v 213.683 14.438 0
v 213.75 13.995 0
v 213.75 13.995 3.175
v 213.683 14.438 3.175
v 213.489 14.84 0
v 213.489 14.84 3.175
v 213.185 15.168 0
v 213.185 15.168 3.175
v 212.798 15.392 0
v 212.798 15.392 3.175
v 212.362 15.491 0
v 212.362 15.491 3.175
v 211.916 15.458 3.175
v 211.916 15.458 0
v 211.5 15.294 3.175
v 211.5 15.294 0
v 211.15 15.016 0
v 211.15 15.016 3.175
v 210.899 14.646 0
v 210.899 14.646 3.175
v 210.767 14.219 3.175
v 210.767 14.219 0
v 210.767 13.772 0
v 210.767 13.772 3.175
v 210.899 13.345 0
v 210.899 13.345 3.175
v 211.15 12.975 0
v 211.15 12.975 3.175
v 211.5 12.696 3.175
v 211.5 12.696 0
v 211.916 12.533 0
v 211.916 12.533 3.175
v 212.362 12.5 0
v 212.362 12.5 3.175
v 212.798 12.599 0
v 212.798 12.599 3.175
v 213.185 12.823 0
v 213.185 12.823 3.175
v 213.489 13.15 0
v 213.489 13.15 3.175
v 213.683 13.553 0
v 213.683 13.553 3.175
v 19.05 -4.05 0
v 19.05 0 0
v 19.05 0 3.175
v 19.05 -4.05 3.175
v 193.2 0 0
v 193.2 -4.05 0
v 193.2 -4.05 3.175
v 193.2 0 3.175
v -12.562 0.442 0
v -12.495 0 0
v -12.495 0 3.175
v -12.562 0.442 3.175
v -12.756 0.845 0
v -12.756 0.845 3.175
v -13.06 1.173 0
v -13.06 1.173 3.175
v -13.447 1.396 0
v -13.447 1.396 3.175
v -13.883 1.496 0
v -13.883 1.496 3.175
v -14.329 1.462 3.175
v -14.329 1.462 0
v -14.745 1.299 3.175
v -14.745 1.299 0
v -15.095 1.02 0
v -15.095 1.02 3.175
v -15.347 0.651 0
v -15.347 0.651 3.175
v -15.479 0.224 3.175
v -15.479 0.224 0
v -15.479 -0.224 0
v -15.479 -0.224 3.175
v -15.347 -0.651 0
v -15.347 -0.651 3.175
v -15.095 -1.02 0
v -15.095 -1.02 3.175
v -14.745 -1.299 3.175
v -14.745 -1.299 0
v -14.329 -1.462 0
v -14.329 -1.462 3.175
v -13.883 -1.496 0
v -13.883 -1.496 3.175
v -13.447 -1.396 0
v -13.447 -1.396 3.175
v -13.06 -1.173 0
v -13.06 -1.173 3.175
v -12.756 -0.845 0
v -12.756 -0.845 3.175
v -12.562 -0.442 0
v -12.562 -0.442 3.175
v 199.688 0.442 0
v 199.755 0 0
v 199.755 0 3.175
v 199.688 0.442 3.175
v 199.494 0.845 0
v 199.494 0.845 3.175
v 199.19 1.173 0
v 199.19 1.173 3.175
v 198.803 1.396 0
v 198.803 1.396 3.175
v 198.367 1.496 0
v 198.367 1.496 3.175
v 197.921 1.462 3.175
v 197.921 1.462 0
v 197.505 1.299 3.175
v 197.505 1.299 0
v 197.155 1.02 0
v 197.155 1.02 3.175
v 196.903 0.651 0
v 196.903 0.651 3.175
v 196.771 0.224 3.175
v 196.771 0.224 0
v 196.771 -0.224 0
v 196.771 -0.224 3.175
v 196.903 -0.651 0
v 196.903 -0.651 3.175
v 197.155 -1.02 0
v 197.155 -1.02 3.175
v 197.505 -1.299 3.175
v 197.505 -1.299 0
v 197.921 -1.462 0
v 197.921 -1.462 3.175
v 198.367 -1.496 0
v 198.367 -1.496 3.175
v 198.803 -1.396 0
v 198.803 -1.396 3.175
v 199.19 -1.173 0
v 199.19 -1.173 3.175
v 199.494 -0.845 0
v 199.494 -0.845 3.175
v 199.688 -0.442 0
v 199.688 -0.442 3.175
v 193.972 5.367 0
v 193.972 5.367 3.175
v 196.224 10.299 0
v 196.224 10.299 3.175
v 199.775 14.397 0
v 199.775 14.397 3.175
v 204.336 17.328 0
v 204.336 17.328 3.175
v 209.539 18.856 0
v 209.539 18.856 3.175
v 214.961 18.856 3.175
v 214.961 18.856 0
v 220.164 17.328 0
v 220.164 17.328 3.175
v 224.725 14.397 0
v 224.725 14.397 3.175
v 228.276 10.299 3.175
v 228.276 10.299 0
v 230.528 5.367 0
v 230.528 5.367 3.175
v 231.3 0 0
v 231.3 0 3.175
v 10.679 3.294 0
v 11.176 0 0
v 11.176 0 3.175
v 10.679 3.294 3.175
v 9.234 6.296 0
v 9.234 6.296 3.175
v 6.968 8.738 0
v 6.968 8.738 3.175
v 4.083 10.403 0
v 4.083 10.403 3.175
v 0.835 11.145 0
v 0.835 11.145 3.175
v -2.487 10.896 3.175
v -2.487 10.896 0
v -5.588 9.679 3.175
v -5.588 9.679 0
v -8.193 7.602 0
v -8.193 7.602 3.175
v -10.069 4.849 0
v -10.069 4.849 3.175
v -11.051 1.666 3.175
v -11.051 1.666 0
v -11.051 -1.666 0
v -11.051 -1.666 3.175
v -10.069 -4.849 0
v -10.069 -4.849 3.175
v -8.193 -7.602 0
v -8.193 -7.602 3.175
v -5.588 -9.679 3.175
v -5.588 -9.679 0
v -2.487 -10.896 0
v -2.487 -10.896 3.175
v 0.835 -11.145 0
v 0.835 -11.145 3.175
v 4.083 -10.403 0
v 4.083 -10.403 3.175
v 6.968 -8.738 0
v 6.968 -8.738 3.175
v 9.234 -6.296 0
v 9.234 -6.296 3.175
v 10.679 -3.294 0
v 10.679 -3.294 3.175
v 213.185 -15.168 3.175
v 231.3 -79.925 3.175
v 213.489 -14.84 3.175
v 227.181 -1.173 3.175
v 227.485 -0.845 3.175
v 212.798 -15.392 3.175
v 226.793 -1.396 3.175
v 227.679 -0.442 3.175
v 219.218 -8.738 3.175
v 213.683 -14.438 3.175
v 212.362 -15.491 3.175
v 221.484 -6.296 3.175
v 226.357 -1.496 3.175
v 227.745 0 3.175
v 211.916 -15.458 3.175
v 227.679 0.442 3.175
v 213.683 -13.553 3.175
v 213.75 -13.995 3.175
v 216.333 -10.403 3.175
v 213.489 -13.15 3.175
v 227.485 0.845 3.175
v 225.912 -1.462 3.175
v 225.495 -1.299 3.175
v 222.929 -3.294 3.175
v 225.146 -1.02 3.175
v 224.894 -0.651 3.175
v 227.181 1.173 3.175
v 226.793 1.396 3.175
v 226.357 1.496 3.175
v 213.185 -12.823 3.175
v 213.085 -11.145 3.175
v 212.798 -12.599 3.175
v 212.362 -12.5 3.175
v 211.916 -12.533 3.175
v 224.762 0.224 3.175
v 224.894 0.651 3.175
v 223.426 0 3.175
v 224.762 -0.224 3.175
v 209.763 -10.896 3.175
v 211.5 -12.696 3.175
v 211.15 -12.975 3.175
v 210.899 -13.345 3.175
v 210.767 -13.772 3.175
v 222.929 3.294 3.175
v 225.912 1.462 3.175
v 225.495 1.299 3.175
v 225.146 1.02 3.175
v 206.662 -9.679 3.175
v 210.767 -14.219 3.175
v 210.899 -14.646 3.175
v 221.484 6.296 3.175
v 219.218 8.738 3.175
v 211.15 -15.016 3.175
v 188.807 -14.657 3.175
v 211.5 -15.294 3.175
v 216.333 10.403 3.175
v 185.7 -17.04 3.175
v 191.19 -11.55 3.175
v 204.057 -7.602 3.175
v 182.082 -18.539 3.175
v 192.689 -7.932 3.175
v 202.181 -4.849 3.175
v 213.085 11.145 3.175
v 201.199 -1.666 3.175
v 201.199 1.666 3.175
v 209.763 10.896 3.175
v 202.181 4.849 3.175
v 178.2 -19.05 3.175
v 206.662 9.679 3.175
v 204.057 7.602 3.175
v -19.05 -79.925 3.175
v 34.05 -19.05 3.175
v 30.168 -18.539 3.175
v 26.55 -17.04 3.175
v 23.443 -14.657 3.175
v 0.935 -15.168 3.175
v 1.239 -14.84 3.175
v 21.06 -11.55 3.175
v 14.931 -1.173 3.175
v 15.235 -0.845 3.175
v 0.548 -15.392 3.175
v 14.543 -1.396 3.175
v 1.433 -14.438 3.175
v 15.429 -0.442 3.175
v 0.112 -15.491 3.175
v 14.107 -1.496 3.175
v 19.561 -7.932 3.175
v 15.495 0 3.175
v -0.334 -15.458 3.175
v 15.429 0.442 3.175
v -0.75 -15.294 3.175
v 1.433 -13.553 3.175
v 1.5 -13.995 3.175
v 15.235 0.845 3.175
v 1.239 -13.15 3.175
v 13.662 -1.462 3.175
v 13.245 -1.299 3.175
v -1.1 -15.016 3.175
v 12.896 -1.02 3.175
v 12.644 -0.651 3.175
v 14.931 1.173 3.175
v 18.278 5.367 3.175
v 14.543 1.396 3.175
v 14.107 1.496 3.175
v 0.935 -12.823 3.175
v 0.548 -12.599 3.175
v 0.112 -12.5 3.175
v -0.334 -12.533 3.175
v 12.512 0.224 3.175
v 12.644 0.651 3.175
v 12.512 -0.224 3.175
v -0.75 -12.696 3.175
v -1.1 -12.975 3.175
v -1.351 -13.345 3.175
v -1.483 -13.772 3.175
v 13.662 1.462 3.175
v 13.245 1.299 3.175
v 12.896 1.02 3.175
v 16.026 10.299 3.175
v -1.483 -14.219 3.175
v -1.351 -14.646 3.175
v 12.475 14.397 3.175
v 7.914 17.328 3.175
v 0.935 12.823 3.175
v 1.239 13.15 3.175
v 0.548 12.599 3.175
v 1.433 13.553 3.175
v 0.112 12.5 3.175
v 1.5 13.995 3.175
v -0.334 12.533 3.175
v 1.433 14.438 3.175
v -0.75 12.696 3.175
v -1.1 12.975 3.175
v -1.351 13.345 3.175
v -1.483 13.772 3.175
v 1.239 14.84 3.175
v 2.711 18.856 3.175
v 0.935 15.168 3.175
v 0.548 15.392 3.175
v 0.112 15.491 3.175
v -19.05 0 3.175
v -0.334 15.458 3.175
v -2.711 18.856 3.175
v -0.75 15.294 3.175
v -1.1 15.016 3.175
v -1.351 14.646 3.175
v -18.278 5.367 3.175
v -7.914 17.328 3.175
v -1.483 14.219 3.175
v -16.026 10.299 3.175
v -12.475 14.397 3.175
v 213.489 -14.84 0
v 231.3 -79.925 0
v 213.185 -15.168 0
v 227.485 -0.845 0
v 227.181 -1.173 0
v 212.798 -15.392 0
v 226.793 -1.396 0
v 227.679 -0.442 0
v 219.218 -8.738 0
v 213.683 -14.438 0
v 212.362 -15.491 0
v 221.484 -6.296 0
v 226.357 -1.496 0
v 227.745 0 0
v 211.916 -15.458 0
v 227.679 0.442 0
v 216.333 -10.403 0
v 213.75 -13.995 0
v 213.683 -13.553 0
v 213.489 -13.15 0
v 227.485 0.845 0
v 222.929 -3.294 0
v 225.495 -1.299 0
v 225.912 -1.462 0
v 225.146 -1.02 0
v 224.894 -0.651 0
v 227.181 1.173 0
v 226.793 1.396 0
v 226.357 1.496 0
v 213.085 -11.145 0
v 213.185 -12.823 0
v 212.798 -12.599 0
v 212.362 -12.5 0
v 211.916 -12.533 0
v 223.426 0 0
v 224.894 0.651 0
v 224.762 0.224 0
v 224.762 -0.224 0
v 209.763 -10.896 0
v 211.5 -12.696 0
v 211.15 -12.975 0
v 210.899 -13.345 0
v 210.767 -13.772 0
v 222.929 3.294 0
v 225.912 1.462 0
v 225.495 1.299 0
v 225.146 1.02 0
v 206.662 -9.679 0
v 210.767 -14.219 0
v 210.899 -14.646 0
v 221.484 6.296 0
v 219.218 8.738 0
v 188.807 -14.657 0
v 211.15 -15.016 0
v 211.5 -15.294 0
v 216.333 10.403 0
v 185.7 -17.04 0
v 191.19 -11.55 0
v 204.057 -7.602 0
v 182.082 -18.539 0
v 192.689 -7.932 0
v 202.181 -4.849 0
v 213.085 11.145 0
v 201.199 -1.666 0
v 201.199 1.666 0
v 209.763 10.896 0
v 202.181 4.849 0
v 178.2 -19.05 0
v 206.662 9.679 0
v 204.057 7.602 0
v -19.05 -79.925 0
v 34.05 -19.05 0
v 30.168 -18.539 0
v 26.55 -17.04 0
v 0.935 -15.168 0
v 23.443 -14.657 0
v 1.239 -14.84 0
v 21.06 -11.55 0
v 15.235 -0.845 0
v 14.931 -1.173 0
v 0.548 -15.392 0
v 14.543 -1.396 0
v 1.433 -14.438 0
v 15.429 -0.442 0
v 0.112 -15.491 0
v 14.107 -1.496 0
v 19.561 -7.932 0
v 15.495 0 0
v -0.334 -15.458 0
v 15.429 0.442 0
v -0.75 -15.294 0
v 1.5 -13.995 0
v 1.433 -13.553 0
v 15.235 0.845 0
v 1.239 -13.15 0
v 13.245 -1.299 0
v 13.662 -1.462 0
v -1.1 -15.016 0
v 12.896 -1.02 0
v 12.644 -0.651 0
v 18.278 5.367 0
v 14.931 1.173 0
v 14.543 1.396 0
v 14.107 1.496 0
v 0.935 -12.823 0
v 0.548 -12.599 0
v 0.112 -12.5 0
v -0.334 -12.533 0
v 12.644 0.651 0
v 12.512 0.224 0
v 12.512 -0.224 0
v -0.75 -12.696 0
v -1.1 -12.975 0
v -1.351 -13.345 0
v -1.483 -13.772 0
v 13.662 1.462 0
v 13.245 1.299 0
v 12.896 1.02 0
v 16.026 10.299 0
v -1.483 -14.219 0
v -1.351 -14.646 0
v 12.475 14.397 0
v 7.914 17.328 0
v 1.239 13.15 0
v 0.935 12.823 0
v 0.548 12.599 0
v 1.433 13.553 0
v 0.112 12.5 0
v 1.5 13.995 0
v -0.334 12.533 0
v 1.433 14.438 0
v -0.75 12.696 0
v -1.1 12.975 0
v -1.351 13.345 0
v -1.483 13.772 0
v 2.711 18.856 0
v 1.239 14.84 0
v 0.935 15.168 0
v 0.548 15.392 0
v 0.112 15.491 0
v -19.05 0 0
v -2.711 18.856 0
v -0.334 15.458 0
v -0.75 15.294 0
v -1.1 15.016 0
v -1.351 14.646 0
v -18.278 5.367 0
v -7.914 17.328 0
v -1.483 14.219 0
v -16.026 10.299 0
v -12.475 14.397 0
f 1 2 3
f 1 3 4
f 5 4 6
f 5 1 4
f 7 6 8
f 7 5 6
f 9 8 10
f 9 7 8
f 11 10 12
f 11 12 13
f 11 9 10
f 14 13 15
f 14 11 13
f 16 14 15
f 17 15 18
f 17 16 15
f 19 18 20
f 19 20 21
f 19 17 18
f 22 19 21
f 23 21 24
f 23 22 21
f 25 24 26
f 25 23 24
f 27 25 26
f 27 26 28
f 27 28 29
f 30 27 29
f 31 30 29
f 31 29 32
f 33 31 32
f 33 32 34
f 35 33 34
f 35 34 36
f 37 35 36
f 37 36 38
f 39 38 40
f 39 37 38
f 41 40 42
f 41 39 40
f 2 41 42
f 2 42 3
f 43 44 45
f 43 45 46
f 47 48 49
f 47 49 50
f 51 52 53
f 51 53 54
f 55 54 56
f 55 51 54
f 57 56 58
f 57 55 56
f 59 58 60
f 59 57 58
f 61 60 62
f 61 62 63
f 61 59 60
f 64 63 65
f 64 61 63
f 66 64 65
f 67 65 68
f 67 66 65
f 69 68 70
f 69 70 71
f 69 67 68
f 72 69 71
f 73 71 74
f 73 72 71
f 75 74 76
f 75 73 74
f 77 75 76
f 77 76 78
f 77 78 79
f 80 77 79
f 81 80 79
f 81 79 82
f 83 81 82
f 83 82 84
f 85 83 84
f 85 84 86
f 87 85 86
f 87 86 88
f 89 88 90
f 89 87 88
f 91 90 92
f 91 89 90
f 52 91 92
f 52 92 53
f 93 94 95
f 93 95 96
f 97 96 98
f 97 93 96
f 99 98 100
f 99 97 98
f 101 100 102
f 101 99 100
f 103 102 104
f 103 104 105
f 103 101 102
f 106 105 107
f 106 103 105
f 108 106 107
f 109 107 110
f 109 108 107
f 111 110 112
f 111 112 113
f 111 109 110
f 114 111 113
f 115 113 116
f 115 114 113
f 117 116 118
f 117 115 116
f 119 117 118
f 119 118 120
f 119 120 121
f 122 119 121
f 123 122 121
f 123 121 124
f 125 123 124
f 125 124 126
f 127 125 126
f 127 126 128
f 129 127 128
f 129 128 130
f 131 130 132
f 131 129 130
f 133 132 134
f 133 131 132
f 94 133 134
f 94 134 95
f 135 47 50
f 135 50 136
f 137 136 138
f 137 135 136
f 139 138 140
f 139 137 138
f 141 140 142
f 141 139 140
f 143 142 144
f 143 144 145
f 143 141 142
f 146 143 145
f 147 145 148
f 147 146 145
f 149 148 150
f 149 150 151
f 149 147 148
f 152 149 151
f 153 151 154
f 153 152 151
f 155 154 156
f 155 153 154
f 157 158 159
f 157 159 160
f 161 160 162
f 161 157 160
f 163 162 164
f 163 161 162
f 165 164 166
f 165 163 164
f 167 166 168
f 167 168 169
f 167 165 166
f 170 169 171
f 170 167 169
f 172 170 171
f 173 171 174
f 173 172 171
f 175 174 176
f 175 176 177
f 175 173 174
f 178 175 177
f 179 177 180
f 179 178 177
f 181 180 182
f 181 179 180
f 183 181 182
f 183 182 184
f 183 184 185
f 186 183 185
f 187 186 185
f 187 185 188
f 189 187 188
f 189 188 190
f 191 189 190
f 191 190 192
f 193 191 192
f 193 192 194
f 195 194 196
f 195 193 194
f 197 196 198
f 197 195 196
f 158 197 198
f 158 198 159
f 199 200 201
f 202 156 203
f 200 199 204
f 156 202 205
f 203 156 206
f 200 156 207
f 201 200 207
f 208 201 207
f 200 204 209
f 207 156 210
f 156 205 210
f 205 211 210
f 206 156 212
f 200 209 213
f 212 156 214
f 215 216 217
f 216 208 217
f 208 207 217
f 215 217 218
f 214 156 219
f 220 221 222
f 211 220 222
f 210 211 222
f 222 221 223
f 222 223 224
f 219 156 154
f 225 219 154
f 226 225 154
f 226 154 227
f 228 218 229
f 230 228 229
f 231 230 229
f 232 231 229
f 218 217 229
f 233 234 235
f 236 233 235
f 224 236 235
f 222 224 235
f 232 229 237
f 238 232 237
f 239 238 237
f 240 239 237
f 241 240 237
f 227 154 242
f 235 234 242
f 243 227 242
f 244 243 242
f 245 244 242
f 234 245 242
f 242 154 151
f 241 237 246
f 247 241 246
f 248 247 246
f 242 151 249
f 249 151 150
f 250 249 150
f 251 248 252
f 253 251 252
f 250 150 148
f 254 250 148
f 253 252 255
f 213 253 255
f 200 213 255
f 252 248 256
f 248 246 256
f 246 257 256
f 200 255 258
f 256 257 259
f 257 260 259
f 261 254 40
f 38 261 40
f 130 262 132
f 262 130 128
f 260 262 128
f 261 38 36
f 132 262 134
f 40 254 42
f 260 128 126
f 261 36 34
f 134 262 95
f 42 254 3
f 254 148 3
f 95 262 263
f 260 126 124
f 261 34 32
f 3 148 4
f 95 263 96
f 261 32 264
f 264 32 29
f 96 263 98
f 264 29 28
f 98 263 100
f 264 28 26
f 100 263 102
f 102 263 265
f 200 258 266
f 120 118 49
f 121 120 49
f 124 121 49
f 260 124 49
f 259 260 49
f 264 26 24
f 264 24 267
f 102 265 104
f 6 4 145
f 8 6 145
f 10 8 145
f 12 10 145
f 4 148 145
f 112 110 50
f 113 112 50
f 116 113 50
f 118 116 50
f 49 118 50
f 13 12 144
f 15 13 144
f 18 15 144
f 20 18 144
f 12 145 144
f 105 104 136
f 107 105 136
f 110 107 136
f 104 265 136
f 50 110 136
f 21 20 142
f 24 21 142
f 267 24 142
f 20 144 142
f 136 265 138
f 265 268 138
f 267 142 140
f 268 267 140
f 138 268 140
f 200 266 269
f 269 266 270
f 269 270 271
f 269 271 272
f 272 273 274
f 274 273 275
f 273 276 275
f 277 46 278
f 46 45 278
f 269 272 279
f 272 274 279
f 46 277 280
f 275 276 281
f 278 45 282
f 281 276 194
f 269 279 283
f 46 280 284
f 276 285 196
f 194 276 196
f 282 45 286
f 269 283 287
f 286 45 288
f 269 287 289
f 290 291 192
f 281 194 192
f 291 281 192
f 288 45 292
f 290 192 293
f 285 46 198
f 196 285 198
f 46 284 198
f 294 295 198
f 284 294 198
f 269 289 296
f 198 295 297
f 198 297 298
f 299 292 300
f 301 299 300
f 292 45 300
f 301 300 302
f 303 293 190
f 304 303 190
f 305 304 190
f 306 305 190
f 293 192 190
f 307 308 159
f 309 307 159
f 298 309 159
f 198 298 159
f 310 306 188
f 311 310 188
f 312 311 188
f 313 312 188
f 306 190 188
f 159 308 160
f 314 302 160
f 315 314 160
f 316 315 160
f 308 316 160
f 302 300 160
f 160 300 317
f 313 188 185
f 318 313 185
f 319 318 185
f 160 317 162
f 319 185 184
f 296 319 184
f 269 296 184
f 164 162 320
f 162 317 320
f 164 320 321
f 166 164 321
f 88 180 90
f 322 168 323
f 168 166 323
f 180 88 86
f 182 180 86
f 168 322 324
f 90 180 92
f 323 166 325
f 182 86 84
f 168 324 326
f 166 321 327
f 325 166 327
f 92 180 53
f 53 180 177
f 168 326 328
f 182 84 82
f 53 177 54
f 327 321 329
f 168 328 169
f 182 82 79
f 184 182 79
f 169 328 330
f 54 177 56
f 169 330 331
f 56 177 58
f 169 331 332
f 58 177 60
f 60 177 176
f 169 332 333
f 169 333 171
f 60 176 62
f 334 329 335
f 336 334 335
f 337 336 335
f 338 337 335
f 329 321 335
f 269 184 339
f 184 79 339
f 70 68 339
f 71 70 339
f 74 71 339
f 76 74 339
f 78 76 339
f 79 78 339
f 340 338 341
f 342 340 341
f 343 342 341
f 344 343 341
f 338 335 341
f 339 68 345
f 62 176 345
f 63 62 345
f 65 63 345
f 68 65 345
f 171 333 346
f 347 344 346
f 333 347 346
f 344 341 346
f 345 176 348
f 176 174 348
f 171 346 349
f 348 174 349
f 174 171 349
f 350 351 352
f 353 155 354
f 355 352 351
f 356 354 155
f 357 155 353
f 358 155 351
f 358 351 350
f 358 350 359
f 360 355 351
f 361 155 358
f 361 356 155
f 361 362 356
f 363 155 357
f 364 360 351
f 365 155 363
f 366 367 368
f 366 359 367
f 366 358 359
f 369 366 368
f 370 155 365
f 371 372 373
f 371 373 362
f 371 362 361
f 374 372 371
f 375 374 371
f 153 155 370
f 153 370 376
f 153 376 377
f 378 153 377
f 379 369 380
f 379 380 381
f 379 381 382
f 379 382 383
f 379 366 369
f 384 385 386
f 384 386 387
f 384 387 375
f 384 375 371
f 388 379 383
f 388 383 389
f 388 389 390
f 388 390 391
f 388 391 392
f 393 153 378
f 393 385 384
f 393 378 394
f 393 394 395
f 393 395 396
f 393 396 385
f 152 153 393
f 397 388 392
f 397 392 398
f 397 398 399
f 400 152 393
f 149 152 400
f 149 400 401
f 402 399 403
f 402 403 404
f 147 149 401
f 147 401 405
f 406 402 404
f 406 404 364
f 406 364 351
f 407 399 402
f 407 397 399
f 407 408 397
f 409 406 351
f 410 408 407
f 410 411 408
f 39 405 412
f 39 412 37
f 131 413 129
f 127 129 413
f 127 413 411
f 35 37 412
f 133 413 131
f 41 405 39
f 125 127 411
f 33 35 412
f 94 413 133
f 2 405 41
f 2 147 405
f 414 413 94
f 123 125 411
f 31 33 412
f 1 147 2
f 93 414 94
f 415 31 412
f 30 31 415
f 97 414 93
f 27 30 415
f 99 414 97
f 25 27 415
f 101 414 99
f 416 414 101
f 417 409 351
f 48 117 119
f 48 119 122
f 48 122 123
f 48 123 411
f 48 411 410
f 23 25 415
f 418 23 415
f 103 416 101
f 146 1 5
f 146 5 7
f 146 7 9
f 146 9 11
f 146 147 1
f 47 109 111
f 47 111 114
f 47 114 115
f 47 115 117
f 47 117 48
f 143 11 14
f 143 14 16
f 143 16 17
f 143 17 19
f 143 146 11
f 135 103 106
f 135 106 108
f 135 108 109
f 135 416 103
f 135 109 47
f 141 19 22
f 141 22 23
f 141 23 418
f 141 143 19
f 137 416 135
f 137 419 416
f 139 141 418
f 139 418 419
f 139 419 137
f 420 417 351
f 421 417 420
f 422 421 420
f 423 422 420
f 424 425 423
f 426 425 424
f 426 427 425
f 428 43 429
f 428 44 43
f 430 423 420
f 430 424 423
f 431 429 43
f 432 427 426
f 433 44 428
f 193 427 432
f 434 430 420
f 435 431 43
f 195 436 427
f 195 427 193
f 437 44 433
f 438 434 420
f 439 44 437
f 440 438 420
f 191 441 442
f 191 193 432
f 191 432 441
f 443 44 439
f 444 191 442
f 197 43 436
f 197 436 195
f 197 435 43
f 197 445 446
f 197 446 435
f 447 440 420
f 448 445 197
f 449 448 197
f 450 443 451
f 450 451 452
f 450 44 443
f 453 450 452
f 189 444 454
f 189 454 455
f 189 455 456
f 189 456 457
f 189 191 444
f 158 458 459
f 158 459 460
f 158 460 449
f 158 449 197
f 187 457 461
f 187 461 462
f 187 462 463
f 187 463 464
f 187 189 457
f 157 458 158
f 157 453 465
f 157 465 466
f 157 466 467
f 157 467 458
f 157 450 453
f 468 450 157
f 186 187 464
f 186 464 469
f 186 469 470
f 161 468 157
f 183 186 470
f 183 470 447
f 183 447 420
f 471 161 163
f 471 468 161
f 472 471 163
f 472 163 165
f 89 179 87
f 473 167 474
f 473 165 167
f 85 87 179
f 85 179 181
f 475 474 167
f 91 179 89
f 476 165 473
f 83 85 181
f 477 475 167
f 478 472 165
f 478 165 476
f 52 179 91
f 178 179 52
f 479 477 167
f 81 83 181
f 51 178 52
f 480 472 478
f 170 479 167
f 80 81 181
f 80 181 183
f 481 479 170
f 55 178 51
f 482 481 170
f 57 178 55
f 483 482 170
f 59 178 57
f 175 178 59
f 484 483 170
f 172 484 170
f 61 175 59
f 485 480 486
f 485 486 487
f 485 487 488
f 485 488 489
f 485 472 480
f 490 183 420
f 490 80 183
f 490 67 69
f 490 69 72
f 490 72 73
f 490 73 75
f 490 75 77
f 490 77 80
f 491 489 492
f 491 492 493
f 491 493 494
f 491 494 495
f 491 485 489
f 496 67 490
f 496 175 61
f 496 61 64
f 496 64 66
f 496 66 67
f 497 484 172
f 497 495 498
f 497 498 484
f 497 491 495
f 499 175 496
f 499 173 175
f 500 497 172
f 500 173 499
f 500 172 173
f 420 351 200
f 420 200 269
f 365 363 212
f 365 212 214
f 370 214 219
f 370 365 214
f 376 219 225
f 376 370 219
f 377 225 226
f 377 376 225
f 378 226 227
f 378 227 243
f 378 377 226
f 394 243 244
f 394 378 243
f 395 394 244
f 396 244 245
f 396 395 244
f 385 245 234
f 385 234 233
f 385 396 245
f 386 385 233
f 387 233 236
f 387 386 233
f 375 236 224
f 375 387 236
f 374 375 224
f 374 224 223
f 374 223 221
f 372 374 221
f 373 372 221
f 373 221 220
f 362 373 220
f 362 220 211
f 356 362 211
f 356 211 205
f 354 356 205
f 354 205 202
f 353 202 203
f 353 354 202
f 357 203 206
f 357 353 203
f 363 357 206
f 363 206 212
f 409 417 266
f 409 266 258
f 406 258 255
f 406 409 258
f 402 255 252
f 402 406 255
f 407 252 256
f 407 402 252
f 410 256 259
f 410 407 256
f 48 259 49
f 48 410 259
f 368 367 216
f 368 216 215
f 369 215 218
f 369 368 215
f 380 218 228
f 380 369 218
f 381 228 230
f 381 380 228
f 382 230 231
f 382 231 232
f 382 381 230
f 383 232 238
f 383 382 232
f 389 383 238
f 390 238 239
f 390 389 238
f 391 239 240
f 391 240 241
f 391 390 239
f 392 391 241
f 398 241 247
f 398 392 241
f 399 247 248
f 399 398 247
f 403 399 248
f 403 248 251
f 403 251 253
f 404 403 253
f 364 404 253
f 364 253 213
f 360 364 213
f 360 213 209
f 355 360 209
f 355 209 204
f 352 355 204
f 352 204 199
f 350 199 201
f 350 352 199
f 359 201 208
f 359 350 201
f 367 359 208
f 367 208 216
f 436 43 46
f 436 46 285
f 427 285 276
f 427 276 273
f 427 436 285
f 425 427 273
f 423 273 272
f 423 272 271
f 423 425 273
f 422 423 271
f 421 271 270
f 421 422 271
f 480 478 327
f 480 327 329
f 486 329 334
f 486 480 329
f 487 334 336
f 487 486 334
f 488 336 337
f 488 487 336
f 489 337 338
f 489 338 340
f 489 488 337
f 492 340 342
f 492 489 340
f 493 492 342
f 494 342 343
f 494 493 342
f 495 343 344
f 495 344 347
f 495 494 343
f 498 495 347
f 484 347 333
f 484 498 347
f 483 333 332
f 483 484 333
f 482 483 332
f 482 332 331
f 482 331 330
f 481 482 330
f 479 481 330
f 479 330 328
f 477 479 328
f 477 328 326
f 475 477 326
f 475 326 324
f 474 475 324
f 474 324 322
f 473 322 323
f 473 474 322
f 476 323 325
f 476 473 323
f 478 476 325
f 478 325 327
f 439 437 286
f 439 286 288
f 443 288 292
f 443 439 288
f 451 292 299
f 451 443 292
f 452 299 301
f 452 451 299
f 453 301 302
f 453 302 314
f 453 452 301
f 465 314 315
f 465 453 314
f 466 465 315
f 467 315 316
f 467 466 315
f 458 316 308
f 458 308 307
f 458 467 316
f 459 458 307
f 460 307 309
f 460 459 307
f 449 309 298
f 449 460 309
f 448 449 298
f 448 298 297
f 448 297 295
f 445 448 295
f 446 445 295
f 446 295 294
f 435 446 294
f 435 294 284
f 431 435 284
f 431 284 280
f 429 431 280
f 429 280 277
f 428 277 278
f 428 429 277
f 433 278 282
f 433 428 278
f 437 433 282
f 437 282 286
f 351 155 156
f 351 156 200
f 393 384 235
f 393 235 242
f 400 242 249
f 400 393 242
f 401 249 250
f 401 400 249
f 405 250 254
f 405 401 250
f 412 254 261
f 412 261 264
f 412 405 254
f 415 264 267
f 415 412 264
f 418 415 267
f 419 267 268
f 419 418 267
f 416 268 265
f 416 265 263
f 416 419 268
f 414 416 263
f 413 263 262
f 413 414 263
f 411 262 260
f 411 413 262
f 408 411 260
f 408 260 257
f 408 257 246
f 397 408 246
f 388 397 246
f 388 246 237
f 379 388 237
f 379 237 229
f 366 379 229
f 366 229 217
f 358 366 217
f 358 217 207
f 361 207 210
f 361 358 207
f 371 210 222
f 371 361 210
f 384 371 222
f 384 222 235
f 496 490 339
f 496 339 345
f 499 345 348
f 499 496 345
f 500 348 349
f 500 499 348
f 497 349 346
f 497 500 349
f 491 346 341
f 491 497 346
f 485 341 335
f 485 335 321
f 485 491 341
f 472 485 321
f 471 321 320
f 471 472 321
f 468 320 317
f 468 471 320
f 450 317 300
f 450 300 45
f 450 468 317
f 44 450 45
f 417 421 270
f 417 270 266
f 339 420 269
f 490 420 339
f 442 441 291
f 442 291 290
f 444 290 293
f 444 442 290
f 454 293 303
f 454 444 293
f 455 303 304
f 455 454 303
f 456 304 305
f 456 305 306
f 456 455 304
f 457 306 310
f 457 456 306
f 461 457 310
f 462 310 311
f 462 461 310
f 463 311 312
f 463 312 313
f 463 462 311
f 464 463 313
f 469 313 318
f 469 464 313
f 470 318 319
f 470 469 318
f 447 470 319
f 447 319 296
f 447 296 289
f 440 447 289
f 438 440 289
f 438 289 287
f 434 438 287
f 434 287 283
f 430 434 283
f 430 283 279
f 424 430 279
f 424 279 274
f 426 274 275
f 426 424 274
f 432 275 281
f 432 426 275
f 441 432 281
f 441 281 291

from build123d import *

# Parameters (mm, degrees)
SKETCH1_R           = 11.176
SKETCH1_R_2         = 1.5
BOSS_EXTRUDE1_DEPTH = 3.175


with BuildPart() as part:
    # Sketch1 → Boss-Extrude1 (new body)
    with BuildSketch(Plane.XY):
        with BuildLine():
            Line((-19.05, -19.05), (-19.05, 0))
            ThreePointArc((-19.05, 0), (0, 19.05), (19.05, 0))
            Line((19.05, 0), (19.05, -4.05))
            ThreePointArc((19.05, -4.05), (23.443398282, -14.656601718), (34.05, -19.05))
            Line((34.05, -19.05), (178.2, -19.05))
            ThreePointArc((178.2, -19.05), (188.806601718, -14.656601718), (193.2, -4.05))
            Line((193.2, -4.05), (193.2, 0))
            ThreePointArc((193.2, 0), (212.25, 19.05), (231.3, 0))
            Line((231.3, 0), (231.3, -19.05))
            Line((231.3, -19.05), (231.3, -79.925453532))
            Line((231.3, -79.925453532), (-19.05, -79.925453532))
            Line((-19.05, -79.925453532), (-19.05, -19.05))
        make_face()
        Circle(SKETCH1_R, mode=Mode.SUBTRACT)
        with Locations((212.25, 0)):
            Circle(SKETCH1_R, mode=Mode.SUBTRACT)
        with Locations((0, 13.9954)):
            Circle(SKETCH1_R_2, mode=Mode.SUBTRACT)
        with Locations((212.25, 13.9954)):
            Circle(SKETCH1_R_2, mode=Mode.SUBTRACT)
        with Locations((13.9954, 0)):
            Circle(SKETCH1_R_2, mode=Mode.SUBTRACT)
        with Locations((0, -13.9954)):
            Circle(SKETCH1_R_2, mode=Mode.SUBTRACT)
        with Locations((-13.9954, 0)):
            Circle(SKETCH1_R_2, mode=Mode.SUBTRACT)
        with Locations((198.2546, 0)):
            Circle(SKETCH1_R_2, mode=Mode.SUBTRACT)
        with Locations((212.25, -13.9954)):
            Circle(SKETCH1_R_2, mode=Mode.SUBTRACT)
        with Locations((226.2454, 0)):
            Circle(SKETCH1_R_2, mode=Mode.SUBTRACT)
    extrude(amount=BOSS_EXTRUDE1_DEPTH)


solid = part.part
